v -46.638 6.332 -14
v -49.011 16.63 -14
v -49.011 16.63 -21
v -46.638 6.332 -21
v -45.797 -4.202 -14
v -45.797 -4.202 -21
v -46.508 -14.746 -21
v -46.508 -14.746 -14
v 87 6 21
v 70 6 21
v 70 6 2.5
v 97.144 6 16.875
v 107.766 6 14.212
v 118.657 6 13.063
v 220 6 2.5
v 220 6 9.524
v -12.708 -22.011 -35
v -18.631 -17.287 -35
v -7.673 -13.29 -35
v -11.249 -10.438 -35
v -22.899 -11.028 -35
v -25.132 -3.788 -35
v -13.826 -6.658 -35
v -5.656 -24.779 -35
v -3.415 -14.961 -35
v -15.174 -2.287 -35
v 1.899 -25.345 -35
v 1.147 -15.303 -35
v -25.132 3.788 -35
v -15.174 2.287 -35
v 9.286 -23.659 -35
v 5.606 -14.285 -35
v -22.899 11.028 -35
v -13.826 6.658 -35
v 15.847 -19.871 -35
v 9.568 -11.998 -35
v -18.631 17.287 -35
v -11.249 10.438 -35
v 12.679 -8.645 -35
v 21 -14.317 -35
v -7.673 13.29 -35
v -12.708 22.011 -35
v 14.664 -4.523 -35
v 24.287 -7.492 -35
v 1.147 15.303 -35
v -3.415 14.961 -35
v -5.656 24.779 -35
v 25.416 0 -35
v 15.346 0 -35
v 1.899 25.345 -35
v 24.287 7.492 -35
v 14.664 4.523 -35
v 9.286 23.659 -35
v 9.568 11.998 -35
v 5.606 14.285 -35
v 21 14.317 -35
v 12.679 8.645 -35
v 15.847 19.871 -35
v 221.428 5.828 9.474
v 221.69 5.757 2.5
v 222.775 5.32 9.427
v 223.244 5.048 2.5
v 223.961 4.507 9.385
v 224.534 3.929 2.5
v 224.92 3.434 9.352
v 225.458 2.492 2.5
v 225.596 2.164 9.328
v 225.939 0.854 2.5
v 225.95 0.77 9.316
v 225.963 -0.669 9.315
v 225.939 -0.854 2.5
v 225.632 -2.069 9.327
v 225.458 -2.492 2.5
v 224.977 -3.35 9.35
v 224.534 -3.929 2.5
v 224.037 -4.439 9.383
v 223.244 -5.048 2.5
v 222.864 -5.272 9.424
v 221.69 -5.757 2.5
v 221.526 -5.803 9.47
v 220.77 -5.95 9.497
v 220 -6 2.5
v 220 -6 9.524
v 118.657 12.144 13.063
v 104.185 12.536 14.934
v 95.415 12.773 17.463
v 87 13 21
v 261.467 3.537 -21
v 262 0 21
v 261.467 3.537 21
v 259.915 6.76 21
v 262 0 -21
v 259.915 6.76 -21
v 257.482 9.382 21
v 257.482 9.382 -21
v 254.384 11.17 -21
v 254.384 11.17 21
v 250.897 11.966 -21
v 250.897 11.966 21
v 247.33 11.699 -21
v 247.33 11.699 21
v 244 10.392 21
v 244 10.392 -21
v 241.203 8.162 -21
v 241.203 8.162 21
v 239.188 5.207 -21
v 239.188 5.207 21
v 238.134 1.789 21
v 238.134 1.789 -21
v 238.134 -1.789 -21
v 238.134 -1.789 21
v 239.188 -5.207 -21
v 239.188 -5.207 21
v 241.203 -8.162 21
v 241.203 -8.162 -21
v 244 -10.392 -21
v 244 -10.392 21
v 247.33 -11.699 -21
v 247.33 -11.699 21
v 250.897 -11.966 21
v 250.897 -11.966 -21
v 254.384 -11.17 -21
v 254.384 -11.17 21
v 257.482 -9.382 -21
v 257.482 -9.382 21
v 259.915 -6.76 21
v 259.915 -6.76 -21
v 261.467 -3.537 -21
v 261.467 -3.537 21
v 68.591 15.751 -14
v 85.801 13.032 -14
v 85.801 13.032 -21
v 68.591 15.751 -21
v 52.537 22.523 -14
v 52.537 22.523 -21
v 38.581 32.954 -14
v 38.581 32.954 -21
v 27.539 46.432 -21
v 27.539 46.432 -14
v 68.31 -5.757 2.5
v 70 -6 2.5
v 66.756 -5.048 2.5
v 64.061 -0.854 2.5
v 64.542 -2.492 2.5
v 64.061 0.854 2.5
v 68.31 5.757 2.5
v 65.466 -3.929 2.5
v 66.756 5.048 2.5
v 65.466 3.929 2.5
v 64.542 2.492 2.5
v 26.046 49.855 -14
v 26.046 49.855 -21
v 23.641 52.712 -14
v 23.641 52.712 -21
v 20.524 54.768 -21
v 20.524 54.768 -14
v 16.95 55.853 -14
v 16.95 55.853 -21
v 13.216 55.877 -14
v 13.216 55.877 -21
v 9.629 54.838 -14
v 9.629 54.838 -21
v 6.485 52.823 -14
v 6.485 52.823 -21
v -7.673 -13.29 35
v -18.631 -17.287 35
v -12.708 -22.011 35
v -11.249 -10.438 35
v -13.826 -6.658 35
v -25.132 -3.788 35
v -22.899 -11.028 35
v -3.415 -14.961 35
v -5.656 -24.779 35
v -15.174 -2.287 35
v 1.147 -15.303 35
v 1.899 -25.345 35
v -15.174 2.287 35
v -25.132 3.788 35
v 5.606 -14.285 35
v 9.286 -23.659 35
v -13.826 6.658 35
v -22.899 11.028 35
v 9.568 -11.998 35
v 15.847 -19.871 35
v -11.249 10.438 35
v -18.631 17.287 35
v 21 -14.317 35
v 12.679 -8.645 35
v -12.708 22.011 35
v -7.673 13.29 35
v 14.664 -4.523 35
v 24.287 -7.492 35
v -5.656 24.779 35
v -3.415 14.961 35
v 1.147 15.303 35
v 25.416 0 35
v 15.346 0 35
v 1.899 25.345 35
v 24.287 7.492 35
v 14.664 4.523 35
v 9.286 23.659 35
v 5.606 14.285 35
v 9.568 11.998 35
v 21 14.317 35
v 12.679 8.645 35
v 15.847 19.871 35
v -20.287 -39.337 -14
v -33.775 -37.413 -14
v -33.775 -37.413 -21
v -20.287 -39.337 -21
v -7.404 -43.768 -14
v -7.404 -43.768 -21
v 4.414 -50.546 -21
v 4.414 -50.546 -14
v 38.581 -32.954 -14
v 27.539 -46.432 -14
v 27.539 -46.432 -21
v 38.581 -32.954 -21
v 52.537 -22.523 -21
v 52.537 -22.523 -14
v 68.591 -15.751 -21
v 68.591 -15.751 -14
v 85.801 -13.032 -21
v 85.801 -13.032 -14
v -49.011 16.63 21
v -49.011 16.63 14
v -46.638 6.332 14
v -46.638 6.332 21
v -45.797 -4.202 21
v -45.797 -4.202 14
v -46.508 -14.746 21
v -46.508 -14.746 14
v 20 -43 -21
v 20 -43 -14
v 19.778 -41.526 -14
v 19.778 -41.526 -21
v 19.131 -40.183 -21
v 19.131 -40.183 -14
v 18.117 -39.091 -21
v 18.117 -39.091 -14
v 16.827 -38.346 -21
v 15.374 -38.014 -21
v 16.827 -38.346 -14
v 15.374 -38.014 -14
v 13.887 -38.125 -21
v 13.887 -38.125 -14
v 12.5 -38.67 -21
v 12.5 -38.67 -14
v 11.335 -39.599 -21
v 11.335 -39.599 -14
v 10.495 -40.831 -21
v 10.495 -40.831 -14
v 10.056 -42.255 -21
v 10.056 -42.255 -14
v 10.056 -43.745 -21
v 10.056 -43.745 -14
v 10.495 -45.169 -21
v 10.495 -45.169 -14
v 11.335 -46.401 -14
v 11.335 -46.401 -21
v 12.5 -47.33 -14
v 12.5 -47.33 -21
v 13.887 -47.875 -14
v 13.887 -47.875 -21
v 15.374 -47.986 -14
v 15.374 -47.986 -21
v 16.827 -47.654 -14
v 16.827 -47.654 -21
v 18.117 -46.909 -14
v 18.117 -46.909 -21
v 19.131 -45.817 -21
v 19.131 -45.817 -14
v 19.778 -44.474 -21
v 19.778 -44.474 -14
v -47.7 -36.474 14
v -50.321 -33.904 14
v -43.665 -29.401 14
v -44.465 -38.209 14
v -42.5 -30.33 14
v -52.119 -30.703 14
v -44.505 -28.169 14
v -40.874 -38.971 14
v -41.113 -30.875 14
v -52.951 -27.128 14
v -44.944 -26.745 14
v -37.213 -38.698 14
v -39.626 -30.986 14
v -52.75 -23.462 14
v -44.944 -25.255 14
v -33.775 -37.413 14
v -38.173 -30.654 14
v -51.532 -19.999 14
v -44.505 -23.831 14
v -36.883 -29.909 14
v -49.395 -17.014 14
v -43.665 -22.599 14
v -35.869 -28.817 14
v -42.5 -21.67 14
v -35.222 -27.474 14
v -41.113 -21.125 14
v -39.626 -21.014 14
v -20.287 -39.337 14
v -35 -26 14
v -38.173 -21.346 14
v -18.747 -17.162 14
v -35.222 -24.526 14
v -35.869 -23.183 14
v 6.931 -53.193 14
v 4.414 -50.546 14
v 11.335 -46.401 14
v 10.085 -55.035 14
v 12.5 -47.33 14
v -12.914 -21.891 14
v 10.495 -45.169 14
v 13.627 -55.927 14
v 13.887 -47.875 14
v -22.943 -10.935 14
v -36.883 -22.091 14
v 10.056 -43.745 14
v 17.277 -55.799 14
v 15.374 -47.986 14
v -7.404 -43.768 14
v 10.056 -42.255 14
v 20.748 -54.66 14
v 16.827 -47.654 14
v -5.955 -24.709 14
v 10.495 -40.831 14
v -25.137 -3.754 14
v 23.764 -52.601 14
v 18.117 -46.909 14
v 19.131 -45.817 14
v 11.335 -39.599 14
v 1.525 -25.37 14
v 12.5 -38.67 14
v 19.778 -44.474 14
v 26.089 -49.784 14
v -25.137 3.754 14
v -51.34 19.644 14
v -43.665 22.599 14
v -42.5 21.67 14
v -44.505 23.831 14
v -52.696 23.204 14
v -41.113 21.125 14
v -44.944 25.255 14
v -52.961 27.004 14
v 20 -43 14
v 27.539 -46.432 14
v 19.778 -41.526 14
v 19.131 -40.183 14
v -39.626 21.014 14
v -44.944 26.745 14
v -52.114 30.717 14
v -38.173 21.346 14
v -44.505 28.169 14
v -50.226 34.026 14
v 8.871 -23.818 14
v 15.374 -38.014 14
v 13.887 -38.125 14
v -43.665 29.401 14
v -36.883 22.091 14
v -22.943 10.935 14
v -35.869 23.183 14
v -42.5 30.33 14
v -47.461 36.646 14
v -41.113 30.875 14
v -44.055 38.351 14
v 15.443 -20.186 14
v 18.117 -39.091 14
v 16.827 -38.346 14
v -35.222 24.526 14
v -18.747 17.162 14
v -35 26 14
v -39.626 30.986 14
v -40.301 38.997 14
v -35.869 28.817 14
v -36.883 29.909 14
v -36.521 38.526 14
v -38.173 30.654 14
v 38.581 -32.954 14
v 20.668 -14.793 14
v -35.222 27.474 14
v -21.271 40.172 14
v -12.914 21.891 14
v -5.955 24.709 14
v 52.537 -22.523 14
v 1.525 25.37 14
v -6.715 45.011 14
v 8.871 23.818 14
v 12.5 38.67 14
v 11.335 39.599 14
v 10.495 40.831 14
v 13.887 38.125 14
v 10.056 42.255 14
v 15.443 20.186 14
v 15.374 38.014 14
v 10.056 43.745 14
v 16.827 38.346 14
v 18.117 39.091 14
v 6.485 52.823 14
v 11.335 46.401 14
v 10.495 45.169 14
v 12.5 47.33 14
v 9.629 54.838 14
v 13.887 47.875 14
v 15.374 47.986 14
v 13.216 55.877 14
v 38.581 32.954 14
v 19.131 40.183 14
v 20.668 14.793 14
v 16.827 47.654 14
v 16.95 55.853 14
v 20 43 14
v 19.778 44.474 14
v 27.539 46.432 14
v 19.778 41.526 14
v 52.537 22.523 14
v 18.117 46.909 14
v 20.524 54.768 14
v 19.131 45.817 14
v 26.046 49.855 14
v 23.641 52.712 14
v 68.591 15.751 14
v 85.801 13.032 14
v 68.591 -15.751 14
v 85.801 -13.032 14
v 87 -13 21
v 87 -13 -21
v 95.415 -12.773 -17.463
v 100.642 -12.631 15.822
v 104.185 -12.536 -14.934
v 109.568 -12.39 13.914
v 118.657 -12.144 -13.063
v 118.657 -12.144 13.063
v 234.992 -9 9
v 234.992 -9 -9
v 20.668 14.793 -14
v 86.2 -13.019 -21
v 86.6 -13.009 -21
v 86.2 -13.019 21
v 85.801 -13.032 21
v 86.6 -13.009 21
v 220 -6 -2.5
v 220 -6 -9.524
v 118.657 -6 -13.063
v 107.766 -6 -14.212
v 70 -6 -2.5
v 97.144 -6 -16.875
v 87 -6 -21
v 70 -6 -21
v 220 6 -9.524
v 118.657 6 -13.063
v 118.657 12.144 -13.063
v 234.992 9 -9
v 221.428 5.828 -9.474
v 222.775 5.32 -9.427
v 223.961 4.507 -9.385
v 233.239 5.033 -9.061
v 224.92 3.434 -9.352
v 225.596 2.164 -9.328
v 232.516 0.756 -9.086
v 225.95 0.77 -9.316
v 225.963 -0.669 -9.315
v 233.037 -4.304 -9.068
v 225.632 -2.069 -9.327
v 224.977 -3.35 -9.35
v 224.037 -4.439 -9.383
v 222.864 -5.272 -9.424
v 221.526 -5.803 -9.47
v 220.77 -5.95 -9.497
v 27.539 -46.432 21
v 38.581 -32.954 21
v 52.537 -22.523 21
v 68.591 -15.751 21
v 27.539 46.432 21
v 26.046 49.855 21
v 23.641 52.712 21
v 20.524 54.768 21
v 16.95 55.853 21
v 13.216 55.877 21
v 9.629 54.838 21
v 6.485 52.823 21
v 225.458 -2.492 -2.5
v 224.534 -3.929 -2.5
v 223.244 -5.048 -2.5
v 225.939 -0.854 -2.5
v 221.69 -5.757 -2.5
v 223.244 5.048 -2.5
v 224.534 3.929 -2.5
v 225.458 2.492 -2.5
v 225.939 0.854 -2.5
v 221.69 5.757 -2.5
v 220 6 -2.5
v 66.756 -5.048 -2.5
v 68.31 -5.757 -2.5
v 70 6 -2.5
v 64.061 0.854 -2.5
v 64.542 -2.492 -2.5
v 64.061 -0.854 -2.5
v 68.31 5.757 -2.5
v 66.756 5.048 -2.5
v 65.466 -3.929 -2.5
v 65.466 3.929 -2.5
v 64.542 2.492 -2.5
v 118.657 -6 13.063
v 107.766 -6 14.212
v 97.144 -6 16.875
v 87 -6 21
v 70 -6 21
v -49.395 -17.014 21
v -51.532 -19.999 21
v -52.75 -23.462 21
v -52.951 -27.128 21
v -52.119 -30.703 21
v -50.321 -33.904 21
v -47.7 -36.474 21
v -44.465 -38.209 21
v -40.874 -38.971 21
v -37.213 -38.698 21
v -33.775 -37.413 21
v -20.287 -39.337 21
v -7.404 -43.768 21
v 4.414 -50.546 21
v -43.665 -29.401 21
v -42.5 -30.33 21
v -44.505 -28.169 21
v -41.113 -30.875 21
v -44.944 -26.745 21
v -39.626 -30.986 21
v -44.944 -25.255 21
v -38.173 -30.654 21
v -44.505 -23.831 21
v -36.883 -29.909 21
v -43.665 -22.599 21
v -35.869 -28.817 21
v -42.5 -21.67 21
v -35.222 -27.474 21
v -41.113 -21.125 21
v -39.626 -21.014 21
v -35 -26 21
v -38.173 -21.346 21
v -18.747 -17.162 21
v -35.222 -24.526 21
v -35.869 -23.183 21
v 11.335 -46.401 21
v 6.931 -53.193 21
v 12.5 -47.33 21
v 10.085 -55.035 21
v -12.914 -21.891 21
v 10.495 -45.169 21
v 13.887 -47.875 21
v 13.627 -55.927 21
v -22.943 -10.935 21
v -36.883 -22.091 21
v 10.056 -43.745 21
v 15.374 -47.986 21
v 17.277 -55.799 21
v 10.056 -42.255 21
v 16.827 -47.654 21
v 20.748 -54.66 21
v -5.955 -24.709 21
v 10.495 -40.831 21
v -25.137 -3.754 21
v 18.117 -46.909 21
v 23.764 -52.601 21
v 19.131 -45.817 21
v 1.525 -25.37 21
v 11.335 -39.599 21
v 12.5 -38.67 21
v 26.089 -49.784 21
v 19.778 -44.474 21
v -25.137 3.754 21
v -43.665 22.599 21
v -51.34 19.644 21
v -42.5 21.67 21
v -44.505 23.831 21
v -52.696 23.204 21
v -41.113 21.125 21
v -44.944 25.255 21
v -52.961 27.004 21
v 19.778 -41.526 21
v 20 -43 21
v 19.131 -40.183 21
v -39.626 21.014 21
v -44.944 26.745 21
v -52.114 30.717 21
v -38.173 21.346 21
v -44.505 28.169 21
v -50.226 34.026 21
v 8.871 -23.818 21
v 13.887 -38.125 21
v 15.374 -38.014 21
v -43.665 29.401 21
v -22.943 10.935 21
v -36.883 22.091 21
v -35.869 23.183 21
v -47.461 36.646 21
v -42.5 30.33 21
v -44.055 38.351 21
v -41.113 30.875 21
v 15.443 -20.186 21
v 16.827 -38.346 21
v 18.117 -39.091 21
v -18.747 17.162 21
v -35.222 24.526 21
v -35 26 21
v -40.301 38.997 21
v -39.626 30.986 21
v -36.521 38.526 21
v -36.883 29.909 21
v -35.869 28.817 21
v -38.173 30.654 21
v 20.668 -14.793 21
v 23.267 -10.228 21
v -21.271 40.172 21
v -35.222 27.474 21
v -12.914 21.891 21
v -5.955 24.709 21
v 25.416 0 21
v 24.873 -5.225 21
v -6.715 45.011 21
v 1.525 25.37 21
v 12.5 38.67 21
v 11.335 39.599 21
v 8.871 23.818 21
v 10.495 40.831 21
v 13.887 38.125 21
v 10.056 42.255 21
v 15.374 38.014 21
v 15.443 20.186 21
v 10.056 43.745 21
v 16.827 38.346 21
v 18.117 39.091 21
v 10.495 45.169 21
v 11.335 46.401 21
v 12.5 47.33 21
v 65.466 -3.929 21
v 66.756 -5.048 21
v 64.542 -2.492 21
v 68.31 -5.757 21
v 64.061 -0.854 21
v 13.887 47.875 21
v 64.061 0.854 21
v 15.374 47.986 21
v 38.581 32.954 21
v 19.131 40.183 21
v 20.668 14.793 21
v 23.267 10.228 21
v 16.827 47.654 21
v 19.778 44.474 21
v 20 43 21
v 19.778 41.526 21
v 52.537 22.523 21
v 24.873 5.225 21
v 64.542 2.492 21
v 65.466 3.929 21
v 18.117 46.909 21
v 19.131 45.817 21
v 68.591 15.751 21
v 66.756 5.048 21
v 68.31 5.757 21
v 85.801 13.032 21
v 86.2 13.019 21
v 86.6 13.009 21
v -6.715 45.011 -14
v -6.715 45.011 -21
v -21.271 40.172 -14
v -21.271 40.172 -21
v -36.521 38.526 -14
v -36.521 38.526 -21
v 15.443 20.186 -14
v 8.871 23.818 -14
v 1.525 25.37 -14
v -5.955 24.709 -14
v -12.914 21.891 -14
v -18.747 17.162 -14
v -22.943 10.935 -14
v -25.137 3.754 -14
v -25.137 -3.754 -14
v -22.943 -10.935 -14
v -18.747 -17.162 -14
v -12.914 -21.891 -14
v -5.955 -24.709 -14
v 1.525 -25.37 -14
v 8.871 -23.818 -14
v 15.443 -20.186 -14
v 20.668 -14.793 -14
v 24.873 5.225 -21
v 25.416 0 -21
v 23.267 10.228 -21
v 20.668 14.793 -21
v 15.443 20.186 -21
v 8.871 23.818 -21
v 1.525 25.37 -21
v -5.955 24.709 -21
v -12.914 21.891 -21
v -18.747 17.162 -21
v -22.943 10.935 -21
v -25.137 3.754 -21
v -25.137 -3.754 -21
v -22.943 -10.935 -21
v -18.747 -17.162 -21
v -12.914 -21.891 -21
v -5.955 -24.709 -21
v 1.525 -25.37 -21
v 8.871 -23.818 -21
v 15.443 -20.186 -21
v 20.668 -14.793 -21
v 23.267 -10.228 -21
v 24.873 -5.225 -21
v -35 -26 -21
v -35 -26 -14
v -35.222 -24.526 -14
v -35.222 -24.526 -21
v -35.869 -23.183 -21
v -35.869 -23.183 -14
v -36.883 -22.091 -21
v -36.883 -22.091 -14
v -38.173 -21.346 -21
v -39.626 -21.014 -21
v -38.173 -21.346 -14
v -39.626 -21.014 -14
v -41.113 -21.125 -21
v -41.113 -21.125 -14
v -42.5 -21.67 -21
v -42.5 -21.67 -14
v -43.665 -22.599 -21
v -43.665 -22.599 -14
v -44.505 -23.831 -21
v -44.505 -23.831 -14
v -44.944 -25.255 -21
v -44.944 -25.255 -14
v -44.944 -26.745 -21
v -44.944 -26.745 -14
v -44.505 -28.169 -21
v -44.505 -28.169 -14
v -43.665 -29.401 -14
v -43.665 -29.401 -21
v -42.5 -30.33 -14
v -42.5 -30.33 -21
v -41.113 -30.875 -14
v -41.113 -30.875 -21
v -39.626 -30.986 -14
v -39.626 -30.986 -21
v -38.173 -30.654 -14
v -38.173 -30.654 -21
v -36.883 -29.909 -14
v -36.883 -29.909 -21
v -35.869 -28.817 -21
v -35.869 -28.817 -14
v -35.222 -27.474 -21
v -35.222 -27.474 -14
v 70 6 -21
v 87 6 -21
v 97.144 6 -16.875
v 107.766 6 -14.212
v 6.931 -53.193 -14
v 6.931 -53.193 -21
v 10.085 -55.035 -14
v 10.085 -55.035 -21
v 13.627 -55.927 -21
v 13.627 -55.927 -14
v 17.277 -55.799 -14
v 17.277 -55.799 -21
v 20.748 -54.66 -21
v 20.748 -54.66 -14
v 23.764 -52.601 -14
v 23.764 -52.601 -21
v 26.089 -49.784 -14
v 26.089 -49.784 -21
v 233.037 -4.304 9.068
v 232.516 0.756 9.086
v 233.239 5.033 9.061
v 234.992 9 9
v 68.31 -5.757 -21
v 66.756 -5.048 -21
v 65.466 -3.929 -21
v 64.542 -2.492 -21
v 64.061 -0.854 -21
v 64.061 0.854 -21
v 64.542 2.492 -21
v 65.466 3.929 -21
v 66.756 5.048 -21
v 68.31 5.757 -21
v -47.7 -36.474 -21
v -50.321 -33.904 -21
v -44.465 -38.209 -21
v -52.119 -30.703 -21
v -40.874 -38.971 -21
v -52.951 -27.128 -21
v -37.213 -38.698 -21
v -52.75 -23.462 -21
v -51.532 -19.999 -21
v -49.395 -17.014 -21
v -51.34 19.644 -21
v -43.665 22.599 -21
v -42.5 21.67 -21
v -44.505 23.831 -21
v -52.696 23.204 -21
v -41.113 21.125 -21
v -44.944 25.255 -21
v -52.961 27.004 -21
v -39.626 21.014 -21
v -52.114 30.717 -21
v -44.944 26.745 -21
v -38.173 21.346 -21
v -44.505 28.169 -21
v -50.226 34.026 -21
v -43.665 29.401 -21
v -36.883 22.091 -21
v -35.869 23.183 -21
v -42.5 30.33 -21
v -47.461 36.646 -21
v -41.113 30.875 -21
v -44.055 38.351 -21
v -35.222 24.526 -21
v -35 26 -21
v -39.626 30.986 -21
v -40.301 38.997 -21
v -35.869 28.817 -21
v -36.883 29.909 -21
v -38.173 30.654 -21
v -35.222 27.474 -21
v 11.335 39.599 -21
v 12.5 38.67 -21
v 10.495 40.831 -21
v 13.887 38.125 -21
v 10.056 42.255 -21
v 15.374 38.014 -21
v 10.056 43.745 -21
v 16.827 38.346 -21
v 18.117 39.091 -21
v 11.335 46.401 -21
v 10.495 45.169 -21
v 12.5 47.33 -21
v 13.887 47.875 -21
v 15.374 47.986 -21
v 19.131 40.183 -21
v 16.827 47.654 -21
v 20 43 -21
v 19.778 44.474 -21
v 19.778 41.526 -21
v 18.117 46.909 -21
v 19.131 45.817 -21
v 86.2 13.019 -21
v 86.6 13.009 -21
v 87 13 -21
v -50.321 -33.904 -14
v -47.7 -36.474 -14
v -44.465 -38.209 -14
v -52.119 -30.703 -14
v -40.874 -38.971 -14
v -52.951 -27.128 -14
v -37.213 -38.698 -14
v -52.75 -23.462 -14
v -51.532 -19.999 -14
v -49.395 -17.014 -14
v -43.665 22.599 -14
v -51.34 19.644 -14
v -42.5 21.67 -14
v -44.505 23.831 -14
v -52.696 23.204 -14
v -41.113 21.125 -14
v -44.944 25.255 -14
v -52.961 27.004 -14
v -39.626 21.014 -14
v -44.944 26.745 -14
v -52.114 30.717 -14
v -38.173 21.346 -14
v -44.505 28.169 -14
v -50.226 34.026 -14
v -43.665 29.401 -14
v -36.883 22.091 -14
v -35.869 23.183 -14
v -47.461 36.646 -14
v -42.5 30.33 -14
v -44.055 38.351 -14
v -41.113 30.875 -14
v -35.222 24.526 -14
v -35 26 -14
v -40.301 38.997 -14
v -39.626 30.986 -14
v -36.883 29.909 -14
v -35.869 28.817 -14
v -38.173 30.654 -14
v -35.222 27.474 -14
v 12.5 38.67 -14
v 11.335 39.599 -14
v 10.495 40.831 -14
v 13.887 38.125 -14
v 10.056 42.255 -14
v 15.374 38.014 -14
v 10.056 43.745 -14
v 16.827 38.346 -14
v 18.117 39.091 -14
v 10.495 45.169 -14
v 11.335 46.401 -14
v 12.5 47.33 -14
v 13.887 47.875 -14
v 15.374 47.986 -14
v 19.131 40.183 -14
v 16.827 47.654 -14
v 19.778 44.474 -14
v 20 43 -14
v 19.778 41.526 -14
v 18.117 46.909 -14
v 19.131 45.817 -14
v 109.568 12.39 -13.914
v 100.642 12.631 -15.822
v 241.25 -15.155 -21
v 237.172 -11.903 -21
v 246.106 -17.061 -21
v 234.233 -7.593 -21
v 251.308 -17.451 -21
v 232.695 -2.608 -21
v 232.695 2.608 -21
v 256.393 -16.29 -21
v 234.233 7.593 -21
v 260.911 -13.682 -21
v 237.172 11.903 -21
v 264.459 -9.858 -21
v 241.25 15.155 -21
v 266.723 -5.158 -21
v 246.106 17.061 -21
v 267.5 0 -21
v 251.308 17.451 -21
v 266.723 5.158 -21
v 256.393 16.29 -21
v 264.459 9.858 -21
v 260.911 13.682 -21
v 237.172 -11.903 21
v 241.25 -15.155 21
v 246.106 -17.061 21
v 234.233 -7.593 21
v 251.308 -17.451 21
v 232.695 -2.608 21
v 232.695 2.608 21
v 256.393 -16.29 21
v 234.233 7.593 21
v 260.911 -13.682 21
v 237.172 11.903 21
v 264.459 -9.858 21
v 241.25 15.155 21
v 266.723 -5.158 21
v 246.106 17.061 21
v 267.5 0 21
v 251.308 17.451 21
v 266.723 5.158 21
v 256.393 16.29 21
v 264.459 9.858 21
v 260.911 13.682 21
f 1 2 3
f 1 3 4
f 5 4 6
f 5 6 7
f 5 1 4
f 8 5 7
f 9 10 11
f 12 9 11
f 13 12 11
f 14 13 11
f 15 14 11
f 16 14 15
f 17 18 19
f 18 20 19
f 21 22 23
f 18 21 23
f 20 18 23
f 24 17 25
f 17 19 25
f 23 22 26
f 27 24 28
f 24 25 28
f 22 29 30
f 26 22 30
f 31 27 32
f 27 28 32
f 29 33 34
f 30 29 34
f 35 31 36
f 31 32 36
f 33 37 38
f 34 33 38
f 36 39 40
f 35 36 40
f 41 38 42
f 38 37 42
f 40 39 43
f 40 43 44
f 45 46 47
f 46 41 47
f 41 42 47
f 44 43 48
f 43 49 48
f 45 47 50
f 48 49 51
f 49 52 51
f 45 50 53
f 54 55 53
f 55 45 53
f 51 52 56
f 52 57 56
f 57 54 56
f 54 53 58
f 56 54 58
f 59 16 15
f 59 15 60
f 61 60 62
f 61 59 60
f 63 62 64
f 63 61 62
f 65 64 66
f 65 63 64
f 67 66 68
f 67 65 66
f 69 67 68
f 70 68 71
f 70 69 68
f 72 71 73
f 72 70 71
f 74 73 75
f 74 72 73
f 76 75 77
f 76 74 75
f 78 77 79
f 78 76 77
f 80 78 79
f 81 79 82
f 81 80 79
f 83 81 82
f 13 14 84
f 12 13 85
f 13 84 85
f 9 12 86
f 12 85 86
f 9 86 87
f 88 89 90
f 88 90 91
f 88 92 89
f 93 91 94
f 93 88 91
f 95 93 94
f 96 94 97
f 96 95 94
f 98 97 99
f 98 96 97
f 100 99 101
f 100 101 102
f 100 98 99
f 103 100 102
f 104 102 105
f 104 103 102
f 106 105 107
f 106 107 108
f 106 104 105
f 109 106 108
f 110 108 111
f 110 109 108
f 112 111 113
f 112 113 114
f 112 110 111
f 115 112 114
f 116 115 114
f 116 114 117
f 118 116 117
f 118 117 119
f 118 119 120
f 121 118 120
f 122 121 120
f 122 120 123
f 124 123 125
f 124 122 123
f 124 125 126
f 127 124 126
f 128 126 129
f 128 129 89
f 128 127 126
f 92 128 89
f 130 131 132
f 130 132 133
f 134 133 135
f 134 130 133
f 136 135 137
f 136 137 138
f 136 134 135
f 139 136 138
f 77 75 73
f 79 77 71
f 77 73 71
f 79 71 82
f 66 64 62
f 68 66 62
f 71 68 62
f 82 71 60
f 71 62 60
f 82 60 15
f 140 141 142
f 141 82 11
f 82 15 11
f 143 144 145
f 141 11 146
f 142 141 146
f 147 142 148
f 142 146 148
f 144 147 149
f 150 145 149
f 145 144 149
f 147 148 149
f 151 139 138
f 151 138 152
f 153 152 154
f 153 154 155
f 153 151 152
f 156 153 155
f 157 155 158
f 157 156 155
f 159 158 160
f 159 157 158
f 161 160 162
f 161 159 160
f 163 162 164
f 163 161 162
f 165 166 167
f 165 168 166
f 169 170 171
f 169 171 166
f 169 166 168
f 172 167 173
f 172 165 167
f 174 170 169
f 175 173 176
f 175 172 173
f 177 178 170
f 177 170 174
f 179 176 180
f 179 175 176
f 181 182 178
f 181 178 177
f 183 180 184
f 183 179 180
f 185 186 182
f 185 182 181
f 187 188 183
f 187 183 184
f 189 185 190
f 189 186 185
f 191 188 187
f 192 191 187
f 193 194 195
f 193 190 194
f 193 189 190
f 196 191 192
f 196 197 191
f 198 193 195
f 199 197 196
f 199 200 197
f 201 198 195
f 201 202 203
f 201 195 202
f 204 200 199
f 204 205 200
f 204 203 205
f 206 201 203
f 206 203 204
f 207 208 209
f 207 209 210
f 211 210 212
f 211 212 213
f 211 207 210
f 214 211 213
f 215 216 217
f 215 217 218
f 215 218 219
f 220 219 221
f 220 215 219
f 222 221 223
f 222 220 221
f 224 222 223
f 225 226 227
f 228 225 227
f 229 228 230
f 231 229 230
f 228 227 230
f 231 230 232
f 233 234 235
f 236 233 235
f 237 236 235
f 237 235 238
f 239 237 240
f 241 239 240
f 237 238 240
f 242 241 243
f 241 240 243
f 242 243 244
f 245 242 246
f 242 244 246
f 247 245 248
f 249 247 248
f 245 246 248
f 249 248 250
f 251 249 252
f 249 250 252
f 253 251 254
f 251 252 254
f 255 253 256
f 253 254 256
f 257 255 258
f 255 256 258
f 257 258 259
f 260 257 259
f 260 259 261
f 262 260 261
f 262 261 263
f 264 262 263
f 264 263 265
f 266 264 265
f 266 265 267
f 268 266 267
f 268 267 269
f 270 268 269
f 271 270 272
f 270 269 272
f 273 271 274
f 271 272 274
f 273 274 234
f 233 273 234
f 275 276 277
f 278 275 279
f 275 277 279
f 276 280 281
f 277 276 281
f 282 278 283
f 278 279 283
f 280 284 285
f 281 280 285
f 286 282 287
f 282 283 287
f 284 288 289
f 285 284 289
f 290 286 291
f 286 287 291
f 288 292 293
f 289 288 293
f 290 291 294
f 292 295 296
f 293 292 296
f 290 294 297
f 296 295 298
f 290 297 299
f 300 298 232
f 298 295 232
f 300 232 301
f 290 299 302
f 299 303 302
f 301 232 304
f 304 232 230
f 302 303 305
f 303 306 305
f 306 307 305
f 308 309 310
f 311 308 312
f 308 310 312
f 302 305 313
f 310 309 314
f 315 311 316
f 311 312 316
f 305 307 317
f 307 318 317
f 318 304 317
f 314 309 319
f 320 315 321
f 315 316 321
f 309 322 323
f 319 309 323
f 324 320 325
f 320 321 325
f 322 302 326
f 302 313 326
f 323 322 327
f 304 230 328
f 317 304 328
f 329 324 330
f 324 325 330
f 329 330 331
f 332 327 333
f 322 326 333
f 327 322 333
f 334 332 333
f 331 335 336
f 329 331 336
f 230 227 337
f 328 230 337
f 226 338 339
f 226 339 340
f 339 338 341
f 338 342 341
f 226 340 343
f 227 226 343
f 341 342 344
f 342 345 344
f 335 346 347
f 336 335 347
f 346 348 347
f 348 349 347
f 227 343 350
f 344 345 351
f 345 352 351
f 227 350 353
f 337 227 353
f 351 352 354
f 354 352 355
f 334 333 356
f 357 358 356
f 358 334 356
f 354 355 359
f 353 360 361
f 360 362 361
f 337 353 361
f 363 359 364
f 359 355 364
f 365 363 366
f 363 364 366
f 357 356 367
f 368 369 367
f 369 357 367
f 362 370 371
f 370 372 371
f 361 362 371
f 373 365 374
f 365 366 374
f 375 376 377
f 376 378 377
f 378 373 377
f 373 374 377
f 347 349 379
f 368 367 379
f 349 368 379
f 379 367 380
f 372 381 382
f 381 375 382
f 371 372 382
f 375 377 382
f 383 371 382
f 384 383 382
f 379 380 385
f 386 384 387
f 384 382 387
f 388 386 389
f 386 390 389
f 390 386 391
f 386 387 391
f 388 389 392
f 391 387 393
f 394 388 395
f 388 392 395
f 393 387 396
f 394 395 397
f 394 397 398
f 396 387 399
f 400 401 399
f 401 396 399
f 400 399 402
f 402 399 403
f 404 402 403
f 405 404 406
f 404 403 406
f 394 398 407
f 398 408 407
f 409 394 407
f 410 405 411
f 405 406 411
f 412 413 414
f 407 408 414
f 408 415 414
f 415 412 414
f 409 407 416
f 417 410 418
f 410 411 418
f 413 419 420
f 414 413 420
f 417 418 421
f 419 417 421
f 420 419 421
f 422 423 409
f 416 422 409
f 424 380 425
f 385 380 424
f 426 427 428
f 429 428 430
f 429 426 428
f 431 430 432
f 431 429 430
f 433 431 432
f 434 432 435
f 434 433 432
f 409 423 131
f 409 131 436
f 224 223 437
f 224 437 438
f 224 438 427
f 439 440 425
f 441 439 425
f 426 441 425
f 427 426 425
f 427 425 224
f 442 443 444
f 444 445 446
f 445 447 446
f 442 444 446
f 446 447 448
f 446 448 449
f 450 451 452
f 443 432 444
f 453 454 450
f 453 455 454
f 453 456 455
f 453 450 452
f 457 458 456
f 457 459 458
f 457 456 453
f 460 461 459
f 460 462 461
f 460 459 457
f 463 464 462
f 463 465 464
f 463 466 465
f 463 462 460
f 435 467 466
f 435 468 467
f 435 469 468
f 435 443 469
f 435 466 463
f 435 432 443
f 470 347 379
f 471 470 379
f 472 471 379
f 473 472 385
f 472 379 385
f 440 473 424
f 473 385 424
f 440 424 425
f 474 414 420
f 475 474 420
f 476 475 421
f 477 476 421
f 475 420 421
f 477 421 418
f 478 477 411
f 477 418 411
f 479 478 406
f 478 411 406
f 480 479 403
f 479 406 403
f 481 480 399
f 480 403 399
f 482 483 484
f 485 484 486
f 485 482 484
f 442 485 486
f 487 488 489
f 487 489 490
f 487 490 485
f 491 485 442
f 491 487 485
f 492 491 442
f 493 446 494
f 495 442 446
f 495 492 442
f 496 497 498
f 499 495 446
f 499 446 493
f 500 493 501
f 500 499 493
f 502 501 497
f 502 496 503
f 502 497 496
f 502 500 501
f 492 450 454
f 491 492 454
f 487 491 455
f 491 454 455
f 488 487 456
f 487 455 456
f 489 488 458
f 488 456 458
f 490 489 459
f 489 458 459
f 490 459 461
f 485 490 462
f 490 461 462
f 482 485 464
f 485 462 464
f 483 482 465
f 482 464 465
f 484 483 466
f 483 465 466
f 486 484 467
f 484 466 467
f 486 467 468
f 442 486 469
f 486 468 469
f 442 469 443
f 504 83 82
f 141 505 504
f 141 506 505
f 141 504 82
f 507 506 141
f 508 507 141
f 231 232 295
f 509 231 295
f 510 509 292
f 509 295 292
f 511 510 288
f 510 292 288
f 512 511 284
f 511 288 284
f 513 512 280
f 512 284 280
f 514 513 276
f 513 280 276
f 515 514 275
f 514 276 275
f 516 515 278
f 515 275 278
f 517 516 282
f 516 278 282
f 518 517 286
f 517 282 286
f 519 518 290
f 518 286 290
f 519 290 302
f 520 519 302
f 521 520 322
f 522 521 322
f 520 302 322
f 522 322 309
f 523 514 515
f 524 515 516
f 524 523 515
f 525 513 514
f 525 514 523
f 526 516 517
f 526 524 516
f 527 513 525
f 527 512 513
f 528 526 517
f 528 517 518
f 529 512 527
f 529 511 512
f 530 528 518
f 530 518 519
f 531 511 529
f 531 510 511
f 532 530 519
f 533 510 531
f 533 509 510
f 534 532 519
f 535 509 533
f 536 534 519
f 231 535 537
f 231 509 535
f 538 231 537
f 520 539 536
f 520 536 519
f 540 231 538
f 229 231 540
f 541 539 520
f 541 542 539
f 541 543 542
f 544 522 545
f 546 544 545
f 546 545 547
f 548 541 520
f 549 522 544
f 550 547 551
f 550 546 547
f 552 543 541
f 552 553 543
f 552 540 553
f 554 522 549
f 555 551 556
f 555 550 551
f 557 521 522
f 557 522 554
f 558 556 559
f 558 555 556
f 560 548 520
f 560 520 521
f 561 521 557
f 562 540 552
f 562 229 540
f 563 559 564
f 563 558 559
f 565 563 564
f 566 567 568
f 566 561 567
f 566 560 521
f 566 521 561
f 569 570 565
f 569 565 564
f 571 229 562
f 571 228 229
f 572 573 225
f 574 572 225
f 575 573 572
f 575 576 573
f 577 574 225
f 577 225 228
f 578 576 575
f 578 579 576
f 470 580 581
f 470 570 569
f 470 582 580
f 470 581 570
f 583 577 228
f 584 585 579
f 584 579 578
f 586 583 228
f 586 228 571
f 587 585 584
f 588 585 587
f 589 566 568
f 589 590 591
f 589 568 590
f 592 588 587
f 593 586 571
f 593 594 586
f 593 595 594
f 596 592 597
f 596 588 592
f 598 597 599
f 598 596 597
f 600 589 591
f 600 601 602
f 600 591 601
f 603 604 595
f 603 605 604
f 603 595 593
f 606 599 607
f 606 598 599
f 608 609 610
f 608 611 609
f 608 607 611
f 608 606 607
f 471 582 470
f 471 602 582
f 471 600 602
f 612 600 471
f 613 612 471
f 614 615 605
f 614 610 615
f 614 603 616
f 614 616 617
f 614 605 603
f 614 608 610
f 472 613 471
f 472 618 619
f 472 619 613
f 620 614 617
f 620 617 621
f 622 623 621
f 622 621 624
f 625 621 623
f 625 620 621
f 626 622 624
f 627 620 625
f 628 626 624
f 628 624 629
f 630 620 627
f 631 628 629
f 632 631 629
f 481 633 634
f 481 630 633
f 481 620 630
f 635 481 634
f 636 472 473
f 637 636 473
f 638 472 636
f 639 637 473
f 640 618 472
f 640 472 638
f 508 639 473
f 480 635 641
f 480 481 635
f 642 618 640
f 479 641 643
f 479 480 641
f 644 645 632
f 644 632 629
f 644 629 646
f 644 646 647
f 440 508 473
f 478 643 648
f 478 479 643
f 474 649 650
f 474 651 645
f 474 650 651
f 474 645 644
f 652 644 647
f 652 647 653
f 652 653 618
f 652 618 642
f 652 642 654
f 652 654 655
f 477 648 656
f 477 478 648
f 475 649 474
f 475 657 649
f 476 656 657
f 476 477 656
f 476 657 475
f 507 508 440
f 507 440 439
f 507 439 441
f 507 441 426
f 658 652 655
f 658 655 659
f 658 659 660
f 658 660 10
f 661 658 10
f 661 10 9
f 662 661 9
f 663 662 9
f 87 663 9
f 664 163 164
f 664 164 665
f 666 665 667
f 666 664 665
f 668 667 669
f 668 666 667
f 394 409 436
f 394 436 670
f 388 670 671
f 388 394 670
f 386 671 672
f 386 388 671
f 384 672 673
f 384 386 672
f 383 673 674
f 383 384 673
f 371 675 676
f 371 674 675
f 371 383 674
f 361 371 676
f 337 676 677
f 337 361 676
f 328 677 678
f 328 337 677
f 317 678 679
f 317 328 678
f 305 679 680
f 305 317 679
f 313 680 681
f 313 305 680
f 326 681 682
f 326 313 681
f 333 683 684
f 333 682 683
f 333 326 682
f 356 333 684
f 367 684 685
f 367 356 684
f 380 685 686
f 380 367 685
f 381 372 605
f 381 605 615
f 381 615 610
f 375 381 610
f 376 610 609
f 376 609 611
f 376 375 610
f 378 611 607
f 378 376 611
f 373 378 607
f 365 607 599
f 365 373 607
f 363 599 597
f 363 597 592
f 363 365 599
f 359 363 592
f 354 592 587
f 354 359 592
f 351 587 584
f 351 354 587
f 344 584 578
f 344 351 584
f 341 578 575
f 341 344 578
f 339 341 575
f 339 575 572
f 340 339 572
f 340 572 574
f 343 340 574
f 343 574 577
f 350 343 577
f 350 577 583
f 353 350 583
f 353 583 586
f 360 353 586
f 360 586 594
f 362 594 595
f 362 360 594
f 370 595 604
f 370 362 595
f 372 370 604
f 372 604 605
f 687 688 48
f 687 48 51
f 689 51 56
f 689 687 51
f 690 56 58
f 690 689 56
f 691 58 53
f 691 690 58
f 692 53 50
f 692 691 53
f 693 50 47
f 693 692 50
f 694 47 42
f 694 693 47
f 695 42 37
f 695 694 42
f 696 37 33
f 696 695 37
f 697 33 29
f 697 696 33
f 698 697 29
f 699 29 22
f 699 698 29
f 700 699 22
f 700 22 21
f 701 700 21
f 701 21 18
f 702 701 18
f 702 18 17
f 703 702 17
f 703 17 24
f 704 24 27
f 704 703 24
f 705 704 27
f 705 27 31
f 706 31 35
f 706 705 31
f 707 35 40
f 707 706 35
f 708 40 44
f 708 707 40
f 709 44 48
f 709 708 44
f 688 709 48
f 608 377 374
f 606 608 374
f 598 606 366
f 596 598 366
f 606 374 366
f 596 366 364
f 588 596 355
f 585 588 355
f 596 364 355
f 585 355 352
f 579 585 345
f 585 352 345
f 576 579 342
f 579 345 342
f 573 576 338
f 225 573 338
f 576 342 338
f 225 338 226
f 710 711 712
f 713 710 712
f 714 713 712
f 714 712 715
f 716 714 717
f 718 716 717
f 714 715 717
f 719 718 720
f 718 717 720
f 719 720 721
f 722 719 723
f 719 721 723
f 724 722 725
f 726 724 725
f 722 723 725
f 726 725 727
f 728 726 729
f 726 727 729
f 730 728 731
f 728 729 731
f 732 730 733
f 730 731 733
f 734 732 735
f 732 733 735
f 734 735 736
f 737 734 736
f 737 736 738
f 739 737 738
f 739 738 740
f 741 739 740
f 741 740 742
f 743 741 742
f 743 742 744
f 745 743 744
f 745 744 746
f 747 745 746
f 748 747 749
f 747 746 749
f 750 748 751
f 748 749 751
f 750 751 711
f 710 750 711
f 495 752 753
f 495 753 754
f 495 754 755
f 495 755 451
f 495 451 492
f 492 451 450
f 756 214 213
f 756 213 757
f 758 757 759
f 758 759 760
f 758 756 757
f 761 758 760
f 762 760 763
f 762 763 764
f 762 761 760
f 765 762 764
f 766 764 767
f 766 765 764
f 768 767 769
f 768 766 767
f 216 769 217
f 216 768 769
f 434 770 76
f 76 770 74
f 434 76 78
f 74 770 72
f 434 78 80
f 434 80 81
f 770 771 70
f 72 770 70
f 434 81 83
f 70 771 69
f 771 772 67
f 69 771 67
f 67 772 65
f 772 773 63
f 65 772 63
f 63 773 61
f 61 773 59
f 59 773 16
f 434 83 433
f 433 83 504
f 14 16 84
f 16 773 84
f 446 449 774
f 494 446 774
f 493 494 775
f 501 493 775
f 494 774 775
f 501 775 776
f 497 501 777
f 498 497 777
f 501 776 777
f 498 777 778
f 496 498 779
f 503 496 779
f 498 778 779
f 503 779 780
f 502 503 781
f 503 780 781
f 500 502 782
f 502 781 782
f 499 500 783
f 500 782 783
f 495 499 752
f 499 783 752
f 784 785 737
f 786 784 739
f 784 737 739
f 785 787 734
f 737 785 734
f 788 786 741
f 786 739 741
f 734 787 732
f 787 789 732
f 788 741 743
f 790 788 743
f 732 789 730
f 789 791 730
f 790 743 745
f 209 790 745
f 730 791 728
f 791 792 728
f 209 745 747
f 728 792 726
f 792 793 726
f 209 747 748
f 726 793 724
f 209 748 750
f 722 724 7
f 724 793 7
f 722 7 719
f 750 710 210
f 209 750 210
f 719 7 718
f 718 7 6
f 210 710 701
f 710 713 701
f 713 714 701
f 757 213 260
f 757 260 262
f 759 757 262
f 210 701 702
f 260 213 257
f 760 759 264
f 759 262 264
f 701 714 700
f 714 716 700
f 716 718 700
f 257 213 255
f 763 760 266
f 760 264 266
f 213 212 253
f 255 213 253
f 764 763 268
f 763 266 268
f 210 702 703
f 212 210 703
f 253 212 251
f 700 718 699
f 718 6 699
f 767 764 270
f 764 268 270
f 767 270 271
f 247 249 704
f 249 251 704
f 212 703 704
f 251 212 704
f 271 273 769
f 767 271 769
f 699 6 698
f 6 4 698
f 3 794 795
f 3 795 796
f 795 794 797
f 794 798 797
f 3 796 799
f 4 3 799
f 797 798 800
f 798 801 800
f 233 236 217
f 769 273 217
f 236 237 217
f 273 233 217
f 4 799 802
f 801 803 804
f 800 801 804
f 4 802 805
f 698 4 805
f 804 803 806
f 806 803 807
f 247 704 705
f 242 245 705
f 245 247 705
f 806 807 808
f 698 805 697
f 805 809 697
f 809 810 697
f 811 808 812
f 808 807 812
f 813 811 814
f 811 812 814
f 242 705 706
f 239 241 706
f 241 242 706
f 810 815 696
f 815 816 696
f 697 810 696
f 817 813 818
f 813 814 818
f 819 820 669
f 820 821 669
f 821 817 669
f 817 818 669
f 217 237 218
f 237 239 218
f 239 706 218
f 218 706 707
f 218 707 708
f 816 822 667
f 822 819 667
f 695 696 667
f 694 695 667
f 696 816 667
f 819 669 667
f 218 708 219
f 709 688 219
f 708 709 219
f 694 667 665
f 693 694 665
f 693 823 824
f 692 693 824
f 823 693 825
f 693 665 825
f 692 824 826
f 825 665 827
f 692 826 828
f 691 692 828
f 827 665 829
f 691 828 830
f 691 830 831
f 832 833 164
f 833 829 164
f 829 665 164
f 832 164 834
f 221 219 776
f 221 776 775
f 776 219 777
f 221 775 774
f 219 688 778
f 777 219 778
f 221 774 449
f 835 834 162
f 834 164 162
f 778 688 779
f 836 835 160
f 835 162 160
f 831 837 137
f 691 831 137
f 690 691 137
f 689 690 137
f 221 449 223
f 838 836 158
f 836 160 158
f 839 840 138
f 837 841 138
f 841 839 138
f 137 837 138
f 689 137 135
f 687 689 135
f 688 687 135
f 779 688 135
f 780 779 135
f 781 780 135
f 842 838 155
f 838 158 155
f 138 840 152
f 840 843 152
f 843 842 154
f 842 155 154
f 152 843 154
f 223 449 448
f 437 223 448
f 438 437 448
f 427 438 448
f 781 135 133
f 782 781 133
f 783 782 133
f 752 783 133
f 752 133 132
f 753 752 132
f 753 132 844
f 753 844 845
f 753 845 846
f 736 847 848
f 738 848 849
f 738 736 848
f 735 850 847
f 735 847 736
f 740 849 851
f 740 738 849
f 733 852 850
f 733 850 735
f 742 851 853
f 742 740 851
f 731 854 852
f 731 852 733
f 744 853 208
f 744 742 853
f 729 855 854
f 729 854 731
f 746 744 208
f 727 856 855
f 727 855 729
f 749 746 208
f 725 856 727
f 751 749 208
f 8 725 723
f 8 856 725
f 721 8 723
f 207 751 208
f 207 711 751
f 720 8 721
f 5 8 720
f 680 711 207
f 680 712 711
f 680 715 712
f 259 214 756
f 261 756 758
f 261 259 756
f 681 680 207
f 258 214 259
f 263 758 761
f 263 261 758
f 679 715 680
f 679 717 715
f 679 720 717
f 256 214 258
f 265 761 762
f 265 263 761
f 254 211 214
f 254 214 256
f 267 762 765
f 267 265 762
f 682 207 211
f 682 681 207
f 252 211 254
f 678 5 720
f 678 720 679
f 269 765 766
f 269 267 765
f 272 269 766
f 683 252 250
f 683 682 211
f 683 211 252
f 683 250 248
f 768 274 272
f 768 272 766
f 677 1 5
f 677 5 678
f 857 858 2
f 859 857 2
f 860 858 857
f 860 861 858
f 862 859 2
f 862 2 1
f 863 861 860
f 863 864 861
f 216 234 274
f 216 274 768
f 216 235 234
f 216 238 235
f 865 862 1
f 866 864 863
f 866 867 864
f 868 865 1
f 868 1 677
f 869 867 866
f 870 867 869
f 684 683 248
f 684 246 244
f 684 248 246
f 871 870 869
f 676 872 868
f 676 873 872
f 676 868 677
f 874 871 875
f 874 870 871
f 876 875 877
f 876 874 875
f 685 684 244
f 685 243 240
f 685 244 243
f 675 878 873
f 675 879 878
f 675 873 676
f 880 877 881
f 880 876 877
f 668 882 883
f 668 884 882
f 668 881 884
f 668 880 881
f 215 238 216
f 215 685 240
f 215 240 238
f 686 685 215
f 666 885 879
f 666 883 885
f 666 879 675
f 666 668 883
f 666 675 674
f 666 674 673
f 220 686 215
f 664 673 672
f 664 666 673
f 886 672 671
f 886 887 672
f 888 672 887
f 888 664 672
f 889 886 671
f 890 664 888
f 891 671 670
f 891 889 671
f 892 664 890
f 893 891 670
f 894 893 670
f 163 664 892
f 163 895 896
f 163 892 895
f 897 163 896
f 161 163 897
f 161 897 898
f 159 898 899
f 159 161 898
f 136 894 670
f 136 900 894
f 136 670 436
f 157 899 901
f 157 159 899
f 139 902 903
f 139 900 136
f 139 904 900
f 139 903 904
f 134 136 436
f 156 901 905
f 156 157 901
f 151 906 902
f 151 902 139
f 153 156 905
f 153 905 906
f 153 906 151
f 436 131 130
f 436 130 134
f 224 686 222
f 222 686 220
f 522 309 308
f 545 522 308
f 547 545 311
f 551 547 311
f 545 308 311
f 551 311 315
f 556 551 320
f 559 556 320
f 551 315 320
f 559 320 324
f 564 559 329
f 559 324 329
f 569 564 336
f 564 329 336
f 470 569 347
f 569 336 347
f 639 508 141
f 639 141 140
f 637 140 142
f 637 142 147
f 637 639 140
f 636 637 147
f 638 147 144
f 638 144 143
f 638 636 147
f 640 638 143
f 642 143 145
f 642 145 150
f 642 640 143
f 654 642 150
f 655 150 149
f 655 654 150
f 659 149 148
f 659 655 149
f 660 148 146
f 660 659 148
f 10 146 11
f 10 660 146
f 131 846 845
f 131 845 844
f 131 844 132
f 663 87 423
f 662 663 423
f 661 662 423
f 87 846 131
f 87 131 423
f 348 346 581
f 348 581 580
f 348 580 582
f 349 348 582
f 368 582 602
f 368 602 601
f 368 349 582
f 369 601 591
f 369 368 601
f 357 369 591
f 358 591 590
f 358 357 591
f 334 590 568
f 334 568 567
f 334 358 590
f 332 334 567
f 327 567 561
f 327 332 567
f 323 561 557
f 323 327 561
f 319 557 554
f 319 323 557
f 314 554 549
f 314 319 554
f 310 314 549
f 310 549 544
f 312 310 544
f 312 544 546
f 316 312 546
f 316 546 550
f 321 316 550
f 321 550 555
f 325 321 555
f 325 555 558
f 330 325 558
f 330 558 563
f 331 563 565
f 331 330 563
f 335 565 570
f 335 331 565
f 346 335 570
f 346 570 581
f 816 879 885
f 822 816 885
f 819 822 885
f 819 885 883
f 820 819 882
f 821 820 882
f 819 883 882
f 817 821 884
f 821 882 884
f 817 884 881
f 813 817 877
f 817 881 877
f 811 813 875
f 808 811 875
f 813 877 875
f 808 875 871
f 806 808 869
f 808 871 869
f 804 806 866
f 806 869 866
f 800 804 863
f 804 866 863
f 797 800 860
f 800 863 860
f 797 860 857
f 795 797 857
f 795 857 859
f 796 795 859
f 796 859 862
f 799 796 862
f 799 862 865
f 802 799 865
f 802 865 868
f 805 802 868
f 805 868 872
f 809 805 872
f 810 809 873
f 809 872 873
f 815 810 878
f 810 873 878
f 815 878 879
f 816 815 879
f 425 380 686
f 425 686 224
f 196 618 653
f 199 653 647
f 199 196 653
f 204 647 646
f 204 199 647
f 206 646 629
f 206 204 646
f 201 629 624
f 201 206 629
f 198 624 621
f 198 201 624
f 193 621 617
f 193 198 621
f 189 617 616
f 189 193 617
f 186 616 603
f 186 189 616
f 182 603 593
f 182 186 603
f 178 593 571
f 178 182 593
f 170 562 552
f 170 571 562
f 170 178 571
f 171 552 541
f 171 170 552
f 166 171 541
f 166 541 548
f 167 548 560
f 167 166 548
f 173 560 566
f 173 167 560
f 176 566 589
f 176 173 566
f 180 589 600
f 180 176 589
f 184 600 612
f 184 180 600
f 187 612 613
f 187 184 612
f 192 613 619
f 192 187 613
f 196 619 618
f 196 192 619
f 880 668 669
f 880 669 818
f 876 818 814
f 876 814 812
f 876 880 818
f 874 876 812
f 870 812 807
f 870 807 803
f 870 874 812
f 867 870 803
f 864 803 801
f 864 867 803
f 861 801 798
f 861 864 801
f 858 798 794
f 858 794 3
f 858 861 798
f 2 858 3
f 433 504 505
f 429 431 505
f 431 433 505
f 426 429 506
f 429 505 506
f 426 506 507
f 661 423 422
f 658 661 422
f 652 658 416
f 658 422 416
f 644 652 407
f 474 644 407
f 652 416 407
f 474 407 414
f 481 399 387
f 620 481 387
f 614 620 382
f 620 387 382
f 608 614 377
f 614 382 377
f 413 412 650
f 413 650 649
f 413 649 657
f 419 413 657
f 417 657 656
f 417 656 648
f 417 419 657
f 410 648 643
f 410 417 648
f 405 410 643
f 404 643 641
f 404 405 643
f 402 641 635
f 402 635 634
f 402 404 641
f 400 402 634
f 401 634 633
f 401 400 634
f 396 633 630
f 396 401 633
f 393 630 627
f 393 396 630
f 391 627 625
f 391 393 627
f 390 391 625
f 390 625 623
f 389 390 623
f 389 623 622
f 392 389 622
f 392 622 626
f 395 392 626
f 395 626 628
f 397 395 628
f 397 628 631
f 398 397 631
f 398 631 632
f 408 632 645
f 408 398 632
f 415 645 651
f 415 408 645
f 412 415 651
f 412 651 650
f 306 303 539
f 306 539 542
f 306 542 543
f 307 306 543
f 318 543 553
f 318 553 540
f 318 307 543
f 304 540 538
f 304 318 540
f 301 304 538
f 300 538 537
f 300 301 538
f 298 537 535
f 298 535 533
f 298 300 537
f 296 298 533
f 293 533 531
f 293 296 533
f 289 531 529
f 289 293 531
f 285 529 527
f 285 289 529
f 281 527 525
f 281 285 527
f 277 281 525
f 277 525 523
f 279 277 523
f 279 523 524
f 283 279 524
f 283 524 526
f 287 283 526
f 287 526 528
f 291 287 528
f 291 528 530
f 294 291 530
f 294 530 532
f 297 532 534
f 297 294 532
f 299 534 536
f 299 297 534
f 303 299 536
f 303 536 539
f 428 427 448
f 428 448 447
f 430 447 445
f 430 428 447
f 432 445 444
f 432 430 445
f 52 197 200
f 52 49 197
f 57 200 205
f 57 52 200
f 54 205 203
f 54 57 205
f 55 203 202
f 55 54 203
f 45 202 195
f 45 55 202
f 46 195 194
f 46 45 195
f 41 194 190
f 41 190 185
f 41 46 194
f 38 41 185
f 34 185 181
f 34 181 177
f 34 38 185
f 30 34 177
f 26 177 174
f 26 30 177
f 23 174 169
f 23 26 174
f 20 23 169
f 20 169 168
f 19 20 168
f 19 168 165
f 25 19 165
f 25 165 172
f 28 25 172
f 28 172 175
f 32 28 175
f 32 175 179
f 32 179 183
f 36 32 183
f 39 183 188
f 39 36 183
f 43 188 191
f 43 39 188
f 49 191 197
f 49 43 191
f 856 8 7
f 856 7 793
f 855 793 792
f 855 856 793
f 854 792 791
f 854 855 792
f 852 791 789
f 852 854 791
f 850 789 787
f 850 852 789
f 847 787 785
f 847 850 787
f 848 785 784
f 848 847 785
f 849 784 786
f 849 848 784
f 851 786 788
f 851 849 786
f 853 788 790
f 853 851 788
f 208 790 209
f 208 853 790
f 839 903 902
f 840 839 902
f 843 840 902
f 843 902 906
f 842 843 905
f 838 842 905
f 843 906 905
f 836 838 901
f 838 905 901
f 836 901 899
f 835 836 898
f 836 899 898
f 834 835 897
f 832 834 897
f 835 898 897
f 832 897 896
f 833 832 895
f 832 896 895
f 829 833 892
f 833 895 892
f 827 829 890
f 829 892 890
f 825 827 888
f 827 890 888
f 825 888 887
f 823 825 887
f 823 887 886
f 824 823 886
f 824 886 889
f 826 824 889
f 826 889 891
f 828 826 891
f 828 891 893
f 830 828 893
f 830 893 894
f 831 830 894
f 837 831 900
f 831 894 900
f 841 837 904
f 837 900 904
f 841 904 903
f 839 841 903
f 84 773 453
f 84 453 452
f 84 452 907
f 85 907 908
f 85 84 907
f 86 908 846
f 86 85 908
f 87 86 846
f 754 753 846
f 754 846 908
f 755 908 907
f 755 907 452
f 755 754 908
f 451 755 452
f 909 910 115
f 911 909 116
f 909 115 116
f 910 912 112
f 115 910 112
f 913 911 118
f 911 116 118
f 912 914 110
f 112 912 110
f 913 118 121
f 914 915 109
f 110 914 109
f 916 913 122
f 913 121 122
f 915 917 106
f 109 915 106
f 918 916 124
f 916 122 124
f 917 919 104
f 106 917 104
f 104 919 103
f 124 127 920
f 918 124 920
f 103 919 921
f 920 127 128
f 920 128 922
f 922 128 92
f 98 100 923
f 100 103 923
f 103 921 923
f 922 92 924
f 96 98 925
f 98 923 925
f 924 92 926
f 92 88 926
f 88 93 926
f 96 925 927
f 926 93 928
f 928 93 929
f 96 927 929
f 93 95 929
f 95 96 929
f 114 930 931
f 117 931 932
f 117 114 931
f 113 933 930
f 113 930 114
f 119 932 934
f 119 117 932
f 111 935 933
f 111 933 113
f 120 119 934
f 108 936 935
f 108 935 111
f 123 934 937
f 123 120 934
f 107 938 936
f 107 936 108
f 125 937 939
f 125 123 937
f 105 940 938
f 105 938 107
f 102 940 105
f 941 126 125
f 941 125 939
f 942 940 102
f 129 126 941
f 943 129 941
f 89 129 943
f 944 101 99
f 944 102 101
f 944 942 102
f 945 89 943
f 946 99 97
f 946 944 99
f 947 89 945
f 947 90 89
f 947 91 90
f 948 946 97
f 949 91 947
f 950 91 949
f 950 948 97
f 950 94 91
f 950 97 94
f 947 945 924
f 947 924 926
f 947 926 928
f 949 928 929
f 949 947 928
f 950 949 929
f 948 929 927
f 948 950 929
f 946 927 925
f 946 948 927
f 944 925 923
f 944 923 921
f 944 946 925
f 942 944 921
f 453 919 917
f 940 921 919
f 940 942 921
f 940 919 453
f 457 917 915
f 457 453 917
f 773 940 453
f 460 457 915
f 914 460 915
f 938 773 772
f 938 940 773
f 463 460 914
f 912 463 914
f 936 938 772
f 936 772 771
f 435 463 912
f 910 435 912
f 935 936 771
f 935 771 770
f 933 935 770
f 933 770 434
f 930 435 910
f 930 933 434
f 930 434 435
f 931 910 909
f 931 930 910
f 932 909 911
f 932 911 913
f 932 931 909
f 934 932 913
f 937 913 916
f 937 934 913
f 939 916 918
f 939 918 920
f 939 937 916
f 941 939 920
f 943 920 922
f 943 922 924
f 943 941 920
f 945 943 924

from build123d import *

# Parameters (mm, degrees)
SKETCH1_R           = 25.416099274
SKETCH1_R_2         = 15.345879333
BOSS_EXTRUDE3_DEPTH = 35
BOSS_EXTRUDE4_DEPTH = 21
CUT_EXTRUDE1_DEPTH  = 21
SKETCH1_7_R         = 17.5
SKETCH1_7_R_2       = 12
BOSS_EXTRUDE5_DEPTH = 21
BOSS_EXTRUDE6_START = 14
SKETCH1_8_R         = 5
BOSS_EXTRUDE6_DEPTH = 7
CUT_EXTRUDE2_DEPTH  = 18.5


with BuildPart() as part:
    # Sketch1 → Boss-Extrude3 (new body, symmetric)
    with BuildSketch(Plane.XY):
        Circle(SKETCH1_R)
        Circle(SKETCH1_R_2, mode=Mode.SUBTRACT)
    extrude(amount=BOSS_EXTRUDE3_DEPTH, both=True)

    # Sketch1<6> → Boss-Extrude4 (add, symmetric)
    with BuildSketch(Plane.XY):
        with BuildLine():
            ThreePointArc((234.99166898, -9), (232.5, 0), (234.99166898, 9))
            Line((234.99166898, 9), (87, 13))
            ThreePointArc((87, 13), (86.400314561, 13.01370903), (85.800764144, 13.032413604))
            Line((85.800764144, 13.032413604), (20.667586541, 14.792868853))
            ThreePointArc((20.667586541, 14.792868853), (24.199871215, 7.768161657), (25.416099274, 0))
            ThreePointArc((25.416099274, 0), (24.199871215, -7.768161657), (20.667586541, -14.792868853))
            Line((20.667586541, -14.792868853), (85.800764144, -13.032413604))
            ThreePointArc((85.800764144, -13.032413604), (86.400314561, -13.01370903), (87, -13))
            Line((87, -13), (234.99166898, -9))
        make_face()
    extrude(amount=BOSS_EXTRUDE4_DEPTH, both=True)

    # Sketch2 → Cut-Extrude1 (cut, symmetric)
    with BuildSketch(Plane(origin=(0, 0, 0), x_dir=(1, 0, 0), z_dir=(0, 1, 0))):
        with BuildLine():
            Line((118.656620919, 13.062509397), (234.99166898, 9))
            Line((234.99166898, 9), (234.99166898, 21))
            Line((234.99166898, 21), (87, 21))
            ThreePointArc((87, 21), (102.408517533, 15.35701958), (118.656620919, 13.062509397))
        make_face()
        with BuildLine():
            Line((87, -21), (234.99166898, -21))
            Line((234.99166898, -21), (234.99166898, -9))
            Line((234.99166898, -9), (118.656620919, -13.062509397))
            ThreePointArc((118.656620919, -13.062509397), (102.408517533, -15.35701958), (87, -21))
        make_face()
    extrude(amount=CUT_EXTRUDE1_DEPTH, both=True, mode=Mode.SUBTRACT)

    # Sketch1<7> → Boss-Extrude5 (add, symmetric)
    with BuildSketch(Plane.XY):
        with Locations((250, 0)):
            Circle(SKETCH1_7_R)
        with Locations((250, 0)):
            Circle(SKETCH1_7_R_2, mode=Mode.SUBTRACT)
    extrude(amount=BOSS_EXTRUDE5_DEPTH, both=True)

    # Sketch1<8> → Boss-Extrude6 (add)
    with BuildSketch(Plane.XY.offset(BOSS_EXTRUDE6_START)):
        with BuildLine():
            Line((20.667586541, 14.792868853), (85.800764144, 13.032413604))
            ThreePointArc((85.800764144, 13.032413604), (52.537254482, 22.523369258), (27.53882285, 46.431897657))
            ThreePointArc((27.53882285, 46.431897657), (18.775996279, 55.439527809), (6.484634563, 52.82285862))
            ThreePointArc((6.484634563, 52.82285862), (-13.863951623, 42.202436765), (-36.520978816, 38.525829777))
            ThreePointArc((-36.520978816, 38.525829777), (-51.292032009, 32.441274184), (-49.011059213, 16.629791258))
            ThreePointArc((-49.011059213, 16.629791258), (-46.024075038, 1.080135069), (-46.508202044, -14.746409188))
            ThreePointArc((-46.508202044, -14.746409188), (-51.333950201, -32.367226465), (-33.774741186, -37.412543656))
            ThreePointArc((-33.774741186, -37.412543656), (-13.740515927, -41.247010721), (4.414359967, -50.546139748))
            ThreePointArc((4.414359967, -50.546139748), (17.277164415, -55.799004736), (27.53882285, -46.431897657))
            ThreePointArc((27.53882285, -46.431897657), (52.537254482, -22.523369258), (85.800764144, -13.032413604))
            Line((85.800764144, -13.032413604), (20.667586541, -14.792868853))
            ThreePointArc((20.667586541, -14.792868853), (-25.416099274, 0), (20.667586541, 14.792868853))
        make_face()
        with Locations((15, -43)):
            Circle(SKETCH1_8_R, mode=Mode.SUBTRACT)
        with Locations((-40, -26)):
            Circle(SKETCH1_8_R, mode=Mode.SUBTRACT)
        with Locations((-40, 26)):
            Circle(SKETCH1_8_R, mode=Mode.SUBTRACT)
        with Locations((15, 43)):
            Circle(SKETCH1_8_R, mode=Mode.SUBTRACT)
    boss_extrude6 = extrude(amount=BOSS_EXTRUDE6_DEPTH)

    # Mirror1: Boss-Extrude6 across plane
    add(boss_extrude6.mirror(Plane.XY))

    # Sketch3 → Cut-Extrude2 (cut)
    with BuildSketch(Plane.XY.offset(21)):
        with BuildLine():
            Line((70, 6), (220, 6))
            ThreePointArc((220, 6), (226, 0), (220, -6))
            Line((220, -6), (70, -6))
            ThreePointArc((70, -6), (64, 0), (70, 6))
        make_face()
    cut_extrude2 = extrude(amount=-CUT_EXTRUDE2_DEPTH, mode=Mode.SUBTRACT)

    # Mirror2: Cut-Extrude2 across plane
    add(cut_extrude2.mirror(Plane.XY), mode=Mode.SUBTRACT)


solid = part.part
